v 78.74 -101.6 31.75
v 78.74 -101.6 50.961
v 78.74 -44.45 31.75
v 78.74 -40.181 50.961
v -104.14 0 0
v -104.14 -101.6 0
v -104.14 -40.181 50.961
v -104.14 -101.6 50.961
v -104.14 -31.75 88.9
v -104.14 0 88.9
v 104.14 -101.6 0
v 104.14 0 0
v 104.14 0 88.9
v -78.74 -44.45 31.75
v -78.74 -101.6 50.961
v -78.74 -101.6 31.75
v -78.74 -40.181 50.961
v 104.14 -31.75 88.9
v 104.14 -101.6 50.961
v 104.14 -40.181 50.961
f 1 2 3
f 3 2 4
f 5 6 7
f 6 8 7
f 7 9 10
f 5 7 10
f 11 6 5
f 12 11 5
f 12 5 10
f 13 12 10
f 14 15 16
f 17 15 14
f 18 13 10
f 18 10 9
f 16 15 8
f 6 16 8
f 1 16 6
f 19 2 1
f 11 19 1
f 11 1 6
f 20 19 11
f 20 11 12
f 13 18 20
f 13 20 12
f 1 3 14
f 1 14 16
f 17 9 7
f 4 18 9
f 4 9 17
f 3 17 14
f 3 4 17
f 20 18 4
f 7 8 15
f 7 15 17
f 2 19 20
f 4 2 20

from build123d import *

# Parameters (mm, degrees)
F1_DEPTH = 104.14
F2_W     = 101.6
F2_H     = 50.960924
F3_DEPTH = 25.4


with BuildPart() as f1:
    # F0 (on Right) → F1 (new body, symmetric)
    with BuildSketch(Plane.YZ):
        Polygon((-101.6, 0), (0, 0), (0, 88.9), (-31.75, 88.9), (-44.45, 31.75), (-101.6, 31.75), align=None)
    extrude(amount=F1_DEPTH, both=True)

    # F2 (on face) → F3 (join)
    with BuildSketch(Plane.YZ.offset(104.14)):
        with Locations((-50.8, 25.480462)):
            Rectangle(F2_W, F2_H)
    extrude(amount=-F3_DEPTH)

    # F4: F1 across plane


with BuildPart() as f1_1:
    add(f1.part)
    add(f1.part.mirror(Plane.YZ))


solid = f1_1.part
